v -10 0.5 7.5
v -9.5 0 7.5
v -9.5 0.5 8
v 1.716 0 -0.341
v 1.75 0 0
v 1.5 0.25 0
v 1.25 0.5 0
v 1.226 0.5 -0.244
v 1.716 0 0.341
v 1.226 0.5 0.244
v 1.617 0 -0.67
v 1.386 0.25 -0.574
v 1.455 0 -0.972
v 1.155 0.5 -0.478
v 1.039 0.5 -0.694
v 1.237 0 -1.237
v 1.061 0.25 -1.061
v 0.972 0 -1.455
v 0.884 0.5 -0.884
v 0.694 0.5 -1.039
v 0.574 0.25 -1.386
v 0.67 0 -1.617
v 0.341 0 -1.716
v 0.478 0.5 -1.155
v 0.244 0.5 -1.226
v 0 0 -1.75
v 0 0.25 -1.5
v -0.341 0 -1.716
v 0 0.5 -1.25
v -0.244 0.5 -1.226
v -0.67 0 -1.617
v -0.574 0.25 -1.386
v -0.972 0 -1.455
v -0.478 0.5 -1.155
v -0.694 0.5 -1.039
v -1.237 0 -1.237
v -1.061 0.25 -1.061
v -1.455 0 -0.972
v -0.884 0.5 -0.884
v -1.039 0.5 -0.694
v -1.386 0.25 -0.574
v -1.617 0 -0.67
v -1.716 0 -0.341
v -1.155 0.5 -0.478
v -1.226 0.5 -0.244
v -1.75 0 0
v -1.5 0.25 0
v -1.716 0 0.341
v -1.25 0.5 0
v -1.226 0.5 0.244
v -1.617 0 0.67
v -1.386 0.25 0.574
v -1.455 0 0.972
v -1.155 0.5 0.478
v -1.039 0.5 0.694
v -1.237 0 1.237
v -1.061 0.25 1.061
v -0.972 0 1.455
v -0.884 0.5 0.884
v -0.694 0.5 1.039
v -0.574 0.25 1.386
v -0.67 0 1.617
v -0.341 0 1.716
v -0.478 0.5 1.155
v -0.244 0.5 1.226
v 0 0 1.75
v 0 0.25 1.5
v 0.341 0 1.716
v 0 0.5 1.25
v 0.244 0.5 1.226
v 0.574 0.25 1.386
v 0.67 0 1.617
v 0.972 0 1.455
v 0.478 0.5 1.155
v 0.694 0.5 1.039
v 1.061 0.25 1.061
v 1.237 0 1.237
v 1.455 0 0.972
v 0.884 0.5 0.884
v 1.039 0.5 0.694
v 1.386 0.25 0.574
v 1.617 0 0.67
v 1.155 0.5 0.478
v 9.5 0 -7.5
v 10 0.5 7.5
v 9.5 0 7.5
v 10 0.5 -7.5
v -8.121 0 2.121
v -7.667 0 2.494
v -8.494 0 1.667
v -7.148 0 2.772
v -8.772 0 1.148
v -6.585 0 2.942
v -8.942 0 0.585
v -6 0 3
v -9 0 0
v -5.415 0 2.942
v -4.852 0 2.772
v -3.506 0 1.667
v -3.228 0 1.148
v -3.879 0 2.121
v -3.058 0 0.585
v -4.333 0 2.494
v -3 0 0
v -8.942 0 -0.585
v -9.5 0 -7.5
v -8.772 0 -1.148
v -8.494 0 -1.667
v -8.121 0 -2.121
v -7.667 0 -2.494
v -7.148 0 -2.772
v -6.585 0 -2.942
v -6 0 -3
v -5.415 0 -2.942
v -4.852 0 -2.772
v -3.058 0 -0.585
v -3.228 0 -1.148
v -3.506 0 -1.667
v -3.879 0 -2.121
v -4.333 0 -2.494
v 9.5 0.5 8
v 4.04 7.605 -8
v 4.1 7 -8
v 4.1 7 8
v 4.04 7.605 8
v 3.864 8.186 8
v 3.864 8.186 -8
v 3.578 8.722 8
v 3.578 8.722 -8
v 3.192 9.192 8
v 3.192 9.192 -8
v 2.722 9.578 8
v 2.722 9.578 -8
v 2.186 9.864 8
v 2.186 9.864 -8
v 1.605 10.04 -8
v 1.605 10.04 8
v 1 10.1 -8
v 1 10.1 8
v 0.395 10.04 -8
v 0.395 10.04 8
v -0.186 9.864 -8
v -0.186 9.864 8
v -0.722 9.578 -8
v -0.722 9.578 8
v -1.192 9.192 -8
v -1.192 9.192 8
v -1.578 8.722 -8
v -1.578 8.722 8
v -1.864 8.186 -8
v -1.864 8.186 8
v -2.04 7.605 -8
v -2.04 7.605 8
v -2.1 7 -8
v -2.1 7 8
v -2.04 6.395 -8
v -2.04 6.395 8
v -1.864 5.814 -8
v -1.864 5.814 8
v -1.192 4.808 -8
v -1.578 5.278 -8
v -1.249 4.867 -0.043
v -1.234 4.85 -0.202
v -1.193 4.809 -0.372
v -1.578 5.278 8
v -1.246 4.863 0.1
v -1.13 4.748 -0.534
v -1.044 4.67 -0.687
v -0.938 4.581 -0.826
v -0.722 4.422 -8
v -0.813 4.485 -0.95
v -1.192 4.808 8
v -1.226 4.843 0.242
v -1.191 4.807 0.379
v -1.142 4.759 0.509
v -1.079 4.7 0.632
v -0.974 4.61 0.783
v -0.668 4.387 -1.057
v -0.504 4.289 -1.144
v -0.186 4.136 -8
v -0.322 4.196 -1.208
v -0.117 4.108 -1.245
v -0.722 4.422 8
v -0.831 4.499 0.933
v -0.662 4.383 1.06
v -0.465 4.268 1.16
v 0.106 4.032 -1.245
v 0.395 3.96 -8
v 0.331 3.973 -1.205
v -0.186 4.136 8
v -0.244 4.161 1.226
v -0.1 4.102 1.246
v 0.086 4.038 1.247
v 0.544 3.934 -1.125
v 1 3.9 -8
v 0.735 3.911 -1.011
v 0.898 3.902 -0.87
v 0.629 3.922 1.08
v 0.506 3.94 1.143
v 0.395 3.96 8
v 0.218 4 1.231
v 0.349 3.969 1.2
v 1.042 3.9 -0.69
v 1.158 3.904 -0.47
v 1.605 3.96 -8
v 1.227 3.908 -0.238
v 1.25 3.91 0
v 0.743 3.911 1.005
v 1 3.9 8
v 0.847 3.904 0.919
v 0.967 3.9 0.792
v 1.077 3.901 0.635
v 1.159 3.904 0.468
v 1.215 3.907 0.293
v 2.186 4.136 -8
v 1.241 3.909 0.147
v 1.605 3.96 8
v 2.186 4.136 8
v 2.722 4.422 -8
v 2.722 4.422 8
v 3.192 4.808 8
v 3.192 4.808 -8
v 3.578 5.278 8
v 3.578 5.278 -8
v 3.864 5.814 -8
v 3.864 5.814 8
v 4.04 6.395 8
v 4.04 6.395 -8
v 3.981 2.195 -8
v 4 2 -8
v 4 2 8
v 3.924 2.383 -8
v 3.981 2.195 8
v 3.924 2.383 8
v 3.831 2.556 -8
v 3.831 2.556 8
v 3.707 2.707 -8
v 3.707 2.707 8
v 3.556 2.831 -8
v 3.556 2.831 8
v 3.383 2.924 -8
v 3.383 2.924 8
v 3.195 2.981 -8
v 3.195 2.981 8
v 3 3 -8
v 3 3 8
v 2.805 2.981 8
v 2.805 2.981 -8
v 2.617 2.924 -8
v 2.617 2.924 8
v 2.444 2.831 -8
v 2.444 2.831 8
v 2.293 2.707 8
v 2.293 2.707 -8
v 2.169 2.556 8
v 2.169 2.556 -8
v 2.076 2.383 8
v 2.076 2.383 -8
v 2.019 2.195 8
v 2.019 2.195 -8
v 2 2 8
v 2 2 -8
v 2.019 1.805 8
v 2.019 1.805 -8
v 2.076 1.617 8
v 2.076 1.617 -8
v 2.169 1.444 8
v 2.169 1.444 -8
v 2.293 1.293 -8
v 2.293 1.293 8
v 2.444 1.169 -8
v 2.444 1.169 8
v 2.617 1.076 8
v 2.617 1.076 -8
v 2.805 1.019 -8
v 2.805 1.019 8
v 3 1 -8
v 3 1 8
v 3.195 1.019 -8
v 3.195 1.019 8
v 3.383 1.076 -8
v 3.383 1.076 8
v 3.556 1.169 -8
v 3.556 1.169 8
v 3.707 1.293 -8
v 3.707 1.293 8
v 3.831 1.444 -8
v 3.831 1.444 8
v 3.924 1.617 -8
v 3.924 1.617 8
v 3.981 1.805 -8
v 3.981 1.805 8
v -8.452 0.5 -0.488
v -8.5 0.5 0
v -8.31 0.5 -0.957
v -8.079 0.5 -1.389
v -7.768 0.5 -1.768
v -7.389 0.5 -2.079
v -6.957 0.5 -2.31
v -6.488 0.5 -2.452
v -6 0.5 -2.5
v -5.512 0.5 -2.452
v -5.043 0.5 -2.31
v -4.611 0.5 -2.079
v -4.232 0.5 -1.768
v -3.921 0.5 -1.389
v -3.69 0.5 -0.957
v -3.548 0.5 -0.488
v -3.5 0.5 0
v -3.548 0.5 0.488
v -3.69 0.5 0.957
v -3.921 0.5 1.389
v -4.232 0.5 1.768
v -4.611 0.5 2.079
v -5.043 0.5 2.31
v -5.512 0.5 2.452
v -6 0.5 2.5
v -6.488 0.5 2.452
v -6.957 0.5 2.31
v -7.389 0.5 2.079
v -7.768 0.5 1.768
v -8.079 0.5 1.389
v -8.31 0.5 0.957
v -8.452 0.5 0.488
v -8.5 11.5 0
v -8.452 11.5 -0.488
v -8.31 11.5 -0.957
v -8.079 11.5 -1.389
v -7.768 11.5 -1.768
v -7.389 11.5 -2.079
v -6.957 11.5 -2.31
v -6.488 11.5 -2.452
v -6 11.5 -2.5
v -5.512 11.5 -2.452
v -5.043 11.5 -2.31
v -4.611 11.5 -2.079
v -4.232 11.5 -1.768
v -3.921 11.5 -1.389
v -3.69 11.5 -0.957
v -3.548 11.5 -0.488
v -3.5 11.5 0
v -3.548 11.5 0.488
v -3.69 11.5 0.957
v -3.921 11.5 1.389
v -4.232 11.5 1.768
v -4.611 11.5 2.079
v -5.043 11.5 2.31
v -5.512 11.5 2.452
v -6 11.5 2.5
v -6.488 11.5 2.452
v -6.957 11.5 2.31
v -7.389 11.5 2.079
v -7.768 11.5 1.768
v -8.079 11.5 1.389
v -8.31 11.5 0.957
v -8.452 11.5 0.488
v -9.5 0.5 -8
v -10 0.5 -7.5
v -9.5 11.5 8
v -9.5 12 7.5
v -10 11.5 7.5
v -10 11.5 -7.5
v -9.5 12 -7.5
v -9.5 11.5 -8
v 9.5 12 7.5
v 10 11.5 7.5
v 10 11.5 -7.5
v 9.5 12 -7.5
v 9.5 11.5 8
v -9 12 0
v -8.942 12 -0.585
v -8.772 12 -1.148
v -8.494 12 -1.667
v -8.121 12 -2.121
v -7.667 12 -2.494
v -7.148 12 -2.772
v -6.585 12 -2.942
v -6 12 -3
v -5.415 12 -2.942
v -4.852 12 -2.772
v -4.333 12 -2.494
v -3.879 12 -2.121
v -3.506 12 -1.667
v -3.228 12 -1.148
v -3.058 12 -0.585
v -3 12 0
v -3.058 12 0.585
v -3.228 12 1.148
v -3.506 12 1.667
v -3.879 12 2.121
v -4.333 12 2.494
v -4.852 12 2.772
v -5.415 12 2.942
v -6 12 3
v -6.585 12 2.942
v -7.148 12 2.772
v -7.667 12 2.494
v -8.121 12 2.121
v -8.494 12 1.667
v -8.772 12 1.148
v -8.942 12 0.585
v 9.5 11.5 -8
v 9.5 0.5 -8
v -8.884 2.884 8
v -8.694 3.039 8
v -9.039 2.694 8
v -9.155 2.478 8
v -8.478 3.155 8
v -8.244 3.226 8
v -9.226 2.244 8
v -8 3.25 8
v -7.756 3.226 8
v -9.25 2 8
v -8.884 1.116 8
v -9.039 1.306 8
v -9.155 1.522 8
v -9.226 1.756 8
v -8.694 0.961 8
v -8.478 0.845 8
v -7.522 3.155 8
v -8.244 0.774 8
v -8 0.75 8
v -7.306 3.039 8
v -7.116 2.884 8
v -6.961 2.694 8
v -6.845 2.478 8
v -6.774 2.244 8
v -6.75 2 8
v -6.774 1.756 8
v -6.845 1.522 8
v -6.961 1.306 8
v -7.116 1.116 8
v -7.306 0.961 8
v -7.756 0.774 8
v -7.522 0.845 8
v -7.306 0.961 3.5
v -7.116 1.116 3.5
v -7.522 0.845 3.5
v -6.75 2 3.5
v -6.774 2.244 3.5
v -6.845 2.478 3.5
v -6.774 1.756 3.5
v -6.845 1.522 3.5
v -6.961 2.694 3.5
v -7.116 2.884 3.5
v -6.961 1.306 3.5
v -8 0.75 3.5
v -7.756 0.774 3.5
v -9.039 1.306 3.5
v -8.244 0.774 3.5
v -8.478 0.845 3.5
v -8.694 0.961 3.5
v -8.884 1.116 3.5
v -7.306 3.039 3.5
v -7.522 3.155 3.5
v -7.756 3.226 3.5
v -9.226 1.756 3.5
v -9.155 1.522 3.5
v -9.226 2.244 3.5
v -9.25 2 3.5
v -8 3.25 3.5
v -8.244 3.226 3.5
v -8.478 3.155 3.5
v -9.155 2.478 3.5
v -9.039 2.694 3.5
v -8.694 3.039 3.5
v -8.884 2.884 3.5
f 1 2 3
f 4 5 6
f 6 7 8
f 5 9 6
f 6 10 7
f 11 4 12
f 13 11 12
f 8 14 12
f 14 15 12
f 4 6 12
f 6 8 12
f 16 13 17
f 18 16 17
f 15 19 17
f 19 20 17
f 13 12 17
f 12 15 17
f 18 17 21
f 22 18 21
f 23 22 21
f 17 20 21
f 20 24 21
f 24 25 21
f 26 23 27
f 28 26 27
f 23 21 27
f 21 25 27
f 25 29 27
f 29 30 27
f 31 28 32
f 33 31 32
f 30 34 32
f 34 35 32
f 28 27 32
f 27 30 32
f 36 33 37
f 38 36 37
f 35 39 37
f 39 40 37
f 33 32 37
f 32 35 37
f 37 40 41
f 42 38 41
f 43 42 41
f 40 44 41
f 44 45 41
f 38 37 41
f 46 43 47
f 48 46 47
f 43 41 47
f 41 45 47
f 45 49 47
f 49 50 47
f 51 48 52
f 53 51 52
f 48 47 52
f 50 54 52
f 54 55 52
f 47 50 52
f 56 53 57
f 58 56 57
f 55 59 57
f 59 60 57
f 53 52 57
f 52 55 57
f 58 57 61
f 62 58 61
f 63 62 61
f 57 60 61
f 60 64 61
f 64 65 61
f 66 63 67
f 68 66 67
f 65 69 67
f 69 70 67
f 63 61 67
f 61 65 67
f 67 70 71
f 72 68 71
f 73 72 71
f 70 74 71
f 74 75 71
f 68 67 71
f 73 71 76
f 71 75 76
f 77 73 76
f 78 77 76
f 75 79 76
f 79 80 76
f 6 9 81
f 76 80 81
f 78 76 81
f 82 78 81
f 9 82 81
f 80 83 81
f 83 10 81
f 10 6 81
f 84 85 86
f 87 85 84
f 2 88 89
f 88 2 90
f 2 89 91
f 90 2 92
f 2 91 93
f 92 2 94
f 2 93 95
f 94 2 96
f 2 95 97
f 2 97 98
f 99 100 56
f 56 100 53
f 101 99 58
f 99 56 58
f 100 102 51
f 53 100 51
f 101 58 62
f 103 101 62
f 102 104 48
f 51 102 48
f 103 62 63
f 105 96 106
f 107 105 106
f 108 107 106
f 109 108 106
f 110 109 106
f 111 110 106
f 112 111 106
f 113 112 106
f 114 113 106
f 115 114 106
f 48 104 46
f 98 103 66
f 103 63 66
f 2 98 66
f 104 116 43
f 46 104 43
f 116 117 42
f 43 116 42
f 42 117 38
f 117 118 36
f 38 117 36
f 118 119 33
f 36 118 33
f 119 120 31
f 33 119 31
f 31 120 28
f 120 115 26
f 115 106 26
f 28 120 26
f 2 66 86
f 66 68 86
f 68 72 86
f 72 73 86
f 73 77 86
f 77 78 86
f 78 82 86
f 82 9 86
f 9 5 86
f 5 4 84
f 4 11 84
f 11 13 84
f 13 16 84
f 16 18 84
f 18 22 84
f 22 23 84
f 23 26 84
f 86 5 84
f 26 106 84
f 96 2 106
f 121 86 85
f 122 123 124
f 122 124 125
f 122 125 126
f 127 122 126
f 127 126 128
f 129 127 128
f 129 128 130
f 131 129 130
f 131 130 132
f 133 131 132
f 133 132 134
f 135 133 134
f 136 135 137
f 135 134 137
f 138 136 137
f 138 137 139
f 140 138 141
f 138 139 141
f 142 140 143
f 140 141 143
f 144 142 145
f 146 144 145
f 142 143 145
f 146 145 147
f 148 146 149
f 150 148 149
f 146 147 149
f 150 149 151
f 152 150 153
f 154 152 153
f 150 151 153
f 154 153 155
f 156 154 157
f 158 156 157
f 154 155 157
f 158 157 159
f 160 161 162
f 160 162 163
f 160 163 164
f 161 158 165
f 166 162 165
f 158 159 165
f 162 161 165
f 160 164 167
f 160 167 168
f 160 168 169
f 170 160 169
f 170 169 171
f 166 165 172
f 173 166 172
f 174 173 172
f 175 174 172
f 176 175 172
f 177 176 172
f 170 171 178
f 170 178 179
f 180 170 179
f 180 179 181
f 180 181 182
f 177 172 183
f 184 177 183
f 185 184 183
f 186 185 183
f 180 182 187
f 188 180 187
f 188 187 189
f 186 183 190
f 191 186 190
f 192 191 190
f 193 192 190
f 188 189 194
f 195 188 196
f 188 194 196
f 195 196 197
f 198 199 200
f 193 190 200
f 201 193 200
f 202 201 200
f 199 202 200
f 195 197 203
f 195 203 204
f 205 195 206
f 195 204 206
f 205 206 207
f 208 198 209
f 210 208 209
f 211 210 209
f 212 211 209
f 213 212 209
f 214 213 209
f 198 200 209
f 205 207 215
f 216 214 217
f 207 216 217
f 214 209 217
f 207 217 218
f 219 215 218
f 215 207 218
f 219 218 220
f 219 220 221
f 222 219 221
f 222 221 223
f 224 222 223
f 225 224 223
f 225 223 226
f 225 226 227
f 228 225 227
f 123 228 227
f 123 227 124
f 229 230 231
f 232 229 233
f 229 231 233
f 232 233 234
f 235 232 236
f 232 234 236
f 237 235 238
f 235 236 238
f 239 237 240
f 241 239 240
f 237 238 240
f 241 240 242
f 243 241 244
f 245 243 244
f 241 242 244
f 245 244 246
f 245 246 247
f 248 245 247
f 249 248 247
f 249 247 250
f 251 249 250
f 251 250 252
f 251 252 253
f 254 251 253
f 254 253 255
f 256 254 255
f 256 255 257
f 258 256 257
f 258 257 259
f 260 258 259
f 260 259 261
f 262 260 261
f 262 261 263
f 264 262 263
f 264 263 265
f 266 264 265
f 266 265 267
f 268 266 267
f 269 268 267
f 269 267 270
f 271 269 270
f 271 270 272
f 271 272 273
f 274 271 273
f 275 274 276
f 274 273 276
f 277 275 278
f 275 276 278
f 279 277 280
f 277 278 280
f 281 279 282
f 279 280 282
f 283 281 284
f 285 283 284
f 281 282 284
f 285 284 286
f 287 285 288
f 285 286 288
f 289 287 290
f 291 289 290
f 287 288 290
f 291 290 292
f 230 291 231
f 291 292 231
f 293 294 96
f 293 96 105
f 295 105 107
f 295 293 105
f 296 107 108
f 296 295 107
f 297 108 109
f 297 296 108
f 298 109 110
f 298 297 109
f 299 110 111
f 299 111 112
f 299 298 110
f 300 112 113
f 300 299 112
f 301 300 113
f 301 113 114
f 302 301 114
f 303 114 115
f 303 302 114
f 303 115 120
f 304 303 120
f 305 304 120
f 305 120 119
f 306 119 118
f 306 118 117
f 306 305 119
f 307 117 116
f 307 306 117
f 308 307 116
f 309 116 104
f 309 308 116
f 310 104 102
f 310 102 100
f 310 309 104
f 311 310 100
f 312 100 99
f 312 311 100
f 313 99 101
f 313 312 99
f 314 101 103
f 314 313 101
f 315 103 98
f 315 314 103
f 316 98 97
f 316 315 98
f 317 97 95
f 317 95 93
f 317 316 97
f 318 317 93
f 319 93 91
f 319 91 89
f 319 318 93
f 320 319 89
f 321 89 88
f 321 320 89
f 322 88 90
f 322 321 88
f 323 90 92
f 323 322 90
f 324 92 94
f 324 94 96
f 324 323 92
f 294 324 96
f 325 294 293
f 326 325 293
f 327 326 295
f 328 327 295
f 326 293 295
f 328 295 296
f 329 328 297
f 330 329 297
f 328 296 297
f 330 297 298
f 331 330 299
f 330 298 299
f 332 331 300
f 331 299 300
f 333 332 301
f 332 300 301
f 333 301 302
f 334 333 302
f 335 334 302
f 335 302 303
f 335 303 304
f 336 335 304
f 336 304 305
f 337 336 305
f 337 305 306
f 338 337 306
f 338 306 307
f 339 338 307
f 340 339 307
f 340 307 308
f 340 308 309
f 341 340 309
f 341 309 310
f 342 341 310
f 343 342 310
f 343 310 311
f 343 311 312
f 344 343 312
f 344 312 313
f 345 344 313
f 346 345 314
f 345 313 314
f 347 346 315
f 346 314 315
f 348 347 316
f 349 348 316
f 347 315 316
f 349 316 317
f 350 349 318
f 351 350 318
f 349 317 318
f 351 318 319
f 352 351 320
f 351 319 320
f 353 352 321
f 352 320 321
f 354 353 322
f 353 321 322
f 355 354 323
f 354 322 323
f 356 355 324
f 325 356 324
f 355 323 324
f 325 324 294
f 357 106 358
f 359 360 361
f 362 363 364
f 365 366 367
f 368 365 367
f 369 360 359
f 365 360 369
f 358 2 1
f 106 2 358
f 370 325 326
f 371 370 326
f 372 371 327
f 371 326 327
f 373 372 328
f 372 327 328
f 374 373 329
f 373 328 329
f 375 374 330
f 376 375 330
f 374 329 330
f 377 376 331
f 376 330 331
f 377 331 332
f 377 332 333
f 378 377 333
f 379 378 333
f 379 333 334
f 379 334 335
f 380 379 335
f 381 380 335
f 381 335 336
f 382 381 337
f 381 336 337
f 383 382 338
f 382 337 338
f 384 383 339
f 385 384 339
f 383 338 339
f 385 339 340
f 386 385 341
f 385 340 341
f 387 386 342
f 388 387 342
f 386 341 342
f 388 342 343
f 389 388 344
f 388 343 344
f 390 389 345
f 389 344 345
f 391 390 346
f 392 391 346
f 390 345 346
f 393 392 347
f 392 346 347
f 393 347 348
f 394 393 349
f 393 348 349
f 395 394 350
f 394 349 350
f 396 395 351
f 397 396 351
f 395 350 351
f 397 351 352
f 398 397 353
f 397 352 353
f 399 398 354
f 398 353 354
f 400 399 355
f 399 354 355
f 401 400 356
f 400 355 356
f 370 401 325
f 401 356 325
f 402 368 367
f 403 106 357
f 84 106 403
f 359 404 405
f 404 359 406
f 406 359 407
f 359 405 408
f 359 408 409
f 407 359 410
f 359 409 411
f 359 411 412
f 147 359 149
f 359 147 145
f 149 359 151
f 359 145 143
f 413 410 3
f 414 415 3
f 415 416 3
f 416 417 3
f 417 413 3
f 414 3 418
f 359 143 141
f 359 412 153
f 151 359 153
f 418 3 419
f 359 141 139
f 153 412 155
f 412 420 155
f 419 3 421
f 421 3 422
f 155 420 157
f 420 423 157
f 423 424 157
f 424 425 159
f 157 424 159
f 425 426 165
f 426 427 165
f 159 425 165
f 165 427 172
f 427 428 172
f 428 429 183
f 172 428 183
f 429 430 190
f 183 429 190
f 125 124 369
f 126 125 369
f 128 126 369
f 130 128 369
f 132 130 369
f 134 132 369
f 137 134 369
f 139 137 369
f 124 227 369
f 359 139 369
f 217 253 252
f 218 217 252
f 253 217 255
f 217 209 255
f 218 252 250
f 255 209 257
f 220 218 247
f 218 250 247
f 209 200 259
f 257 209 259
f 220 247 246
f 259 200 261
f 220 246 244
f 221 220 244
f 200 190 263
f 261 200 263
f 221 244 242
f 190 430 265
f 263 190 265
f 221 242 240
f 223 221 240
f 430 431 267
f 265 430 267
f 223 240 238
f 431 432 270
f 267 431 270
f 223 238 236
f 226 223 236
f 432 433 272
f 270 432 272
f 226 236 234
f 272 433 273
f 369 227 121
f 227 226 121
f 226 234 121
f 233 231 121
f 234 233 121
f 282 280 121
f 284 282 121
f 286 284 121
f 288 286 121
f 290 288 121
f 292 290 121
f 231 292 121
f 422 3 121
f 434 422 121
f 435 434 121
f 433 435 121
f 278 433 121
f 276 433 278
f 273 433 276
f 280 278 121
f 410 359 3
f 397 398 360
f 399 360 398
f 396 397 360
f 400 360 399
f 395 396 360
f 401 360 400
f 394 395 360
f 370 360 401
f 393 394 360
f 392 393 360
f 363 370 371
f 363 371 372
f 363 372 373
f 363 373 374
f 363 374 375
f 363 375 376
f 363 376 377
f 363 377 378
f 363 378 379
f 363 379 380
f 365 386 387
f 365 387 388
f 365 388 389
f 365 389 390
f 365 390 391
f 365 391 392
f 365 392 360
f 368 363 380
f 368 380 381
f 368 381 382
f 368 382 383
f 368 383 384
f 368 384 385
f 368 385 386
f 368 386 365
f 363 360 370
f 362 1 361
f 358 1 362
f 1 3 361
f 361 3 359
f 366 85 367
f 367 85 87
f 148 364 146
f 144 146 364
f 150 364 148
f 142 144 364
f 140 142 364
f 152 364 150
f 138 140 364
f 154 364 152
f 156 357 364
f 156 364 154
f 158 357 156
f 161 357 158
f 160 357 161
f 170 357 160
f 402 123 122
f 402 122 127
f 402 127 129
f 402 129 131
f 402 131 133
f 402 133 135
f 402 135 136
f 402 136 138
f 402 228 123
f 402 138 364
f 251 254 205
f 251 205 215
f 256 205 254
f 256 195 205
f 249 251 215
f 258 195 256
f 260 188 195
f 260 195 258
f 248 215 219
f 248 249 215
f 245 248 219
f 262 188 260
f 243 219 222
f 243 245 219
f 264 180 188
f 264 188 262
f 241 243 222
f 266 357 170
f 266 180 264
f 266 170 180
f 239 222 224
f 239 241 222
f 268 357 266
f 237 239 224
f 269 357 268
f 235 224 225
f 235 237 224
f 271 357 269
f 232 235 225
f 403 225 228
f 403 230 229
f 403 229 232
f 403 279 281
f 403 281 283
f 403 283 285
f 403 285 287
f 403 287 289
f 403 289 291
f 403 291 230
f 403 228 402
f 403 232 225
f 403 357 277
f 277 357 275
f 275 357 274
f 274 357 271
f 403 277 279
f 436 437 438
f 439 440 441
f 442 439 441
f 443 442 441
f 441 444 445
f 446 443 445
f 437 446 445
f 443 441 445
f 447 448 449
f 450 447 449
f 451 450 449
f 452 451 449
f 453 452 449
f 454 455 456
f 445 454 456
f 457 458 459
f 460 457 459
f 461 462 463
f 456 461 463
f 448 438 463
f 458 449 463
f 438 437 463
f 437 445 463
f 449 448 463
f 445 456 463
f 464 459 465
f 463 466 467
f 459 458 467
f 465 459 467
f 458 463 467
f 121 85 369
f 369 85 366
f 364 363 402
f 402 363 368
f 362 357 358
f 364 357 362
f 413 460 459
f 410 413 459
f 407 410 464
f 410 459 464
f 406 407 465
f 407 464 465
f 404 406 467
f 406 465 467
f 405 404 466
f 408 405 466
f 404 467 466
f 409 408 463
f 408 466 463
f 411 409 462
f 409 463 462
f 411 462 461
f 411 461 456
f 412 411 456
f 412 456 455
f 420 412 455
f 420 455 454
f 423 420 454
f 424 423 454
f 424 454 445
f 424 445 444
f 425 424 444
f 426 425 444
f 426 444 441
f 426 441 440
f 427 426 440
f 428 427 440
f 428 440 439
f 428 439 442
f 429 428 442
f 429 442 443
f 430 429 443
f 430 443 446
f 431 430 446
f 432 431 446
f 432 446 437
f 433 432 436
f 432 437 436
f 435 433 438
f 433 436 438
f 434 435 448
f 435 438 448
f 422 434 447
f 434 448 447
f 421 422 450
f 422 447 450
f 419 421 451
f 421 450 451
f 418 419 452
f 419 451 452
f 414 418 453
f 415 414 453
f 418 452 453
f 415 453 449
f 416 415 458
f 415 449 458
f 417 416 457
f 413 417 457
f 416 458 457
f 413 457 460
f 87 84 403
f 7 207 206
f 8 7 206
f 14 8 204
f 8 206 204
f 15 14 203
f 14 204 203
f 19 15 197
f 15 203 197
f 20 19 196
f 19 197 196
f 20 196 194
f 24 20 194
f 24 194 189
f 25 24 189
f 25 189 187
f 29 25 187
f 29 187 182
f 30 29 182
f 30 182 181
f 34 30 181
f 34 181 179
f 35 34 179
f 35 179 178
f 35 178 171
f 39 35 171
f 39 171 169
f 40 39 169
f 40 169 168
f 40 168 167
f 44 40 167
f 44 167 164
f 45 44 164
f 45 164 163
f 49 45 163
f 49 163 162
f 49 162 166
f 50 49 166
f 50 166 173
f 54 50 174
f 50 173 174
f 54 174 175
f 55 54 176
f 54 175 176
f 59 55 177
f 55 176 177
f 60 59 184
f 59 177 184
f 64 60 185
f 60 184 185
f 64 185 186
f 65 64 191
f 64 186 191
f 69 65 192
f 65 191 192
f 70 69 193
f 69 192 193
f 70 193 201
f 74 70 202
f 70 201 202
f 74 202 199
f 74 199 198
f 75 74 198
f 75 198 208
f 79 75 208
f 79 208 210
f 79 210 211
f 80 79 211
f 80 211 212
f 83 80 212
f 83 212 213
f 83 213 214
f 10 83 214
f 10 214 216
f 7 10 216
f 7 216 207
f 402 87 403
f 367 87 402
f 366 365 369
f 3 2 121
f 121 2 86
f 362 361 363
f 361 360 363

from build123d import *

# Parameters (mm, degrees)
SKETCH1_W                       = 20
SKETCH1_H                       = 16
BOSS_EXTRUDE1_DEPTH             = 12
SKETCH2_R                       = 3.1
SKETCH2_R_2                     = 1
CUT_EXTRUDE1_DEPTH              = 17
F_2_5_2_5_DIAMETER_HOLE1_D      = 2.5
F_2_5_2_5_DIAMETER_HOLE1_DEPTH  = 4.5
TAP_DRILL_FOR_M6X1_0_TAP1_D     = 5
TAP_DRILL_FOR_M3X0_5_TAP1_D     = 2.5
TAP_DRILL_FOR_M3X0_5_TAP1_DEPTH = 6.999
TAP_DRILL_FOR_M3X0_5_TAP1_TIP   = 0.751075774
CHAMFER1_SIZE                   = 0.5


with BuildPart() as part:
    # Sketch1 → Boss-Extrude1 (new body)
    with BuildSketch(Plane(origin=(0, 0, 0), x_dir=(1, 0, 0), z_dir=(0, 1, 0))):
        Rectangle(SKETCH1_W, SKETCH1_H)
    extrude(amount=BOSS_EXTRUDE1_DEPTH)

    # Sketch2 → Cut-Extrude1 (cut, through all)
    with BuildSketch(Plane.XY.offset(8)):
        with Locations((1, 7)):
            Circle(SKETCH2_R)
        with Locations((3, 2)):
            Circle(SKETCH2_R_2)
    extrude(amount=-CUT_EXTRUDE1_DEPTH, mode=Mode.SUBTRACT)

    # Ø2.5 (2.5) Diameter Hole1
    with Locations(Plane.XY.offset(8)):
        with Locations((-8, 2)):
            Hole(F_2_5_2_5_DIAMETER_HOLE1_D / 2, depth=F_2_5_2_5_DIAMETER_HOLE1_DEPTH)

    # Tap Drill for M6x1.0 Tap1 (through all)
    with Locations(Plane(origin=(0, 12, 0), x_dir=(1, 0, 0), z_dir=(0, 1, 0))):
        with Locations((-6, 0)):
            Hole(TAP_DRILL_FOR_M6X1_0_TAP1_D / 2)

    # Tap Drill for M3x0.5 Tap1
    with Locations(Plane(origin=(0, 0, 0), x_dir=(-1, 0, 0), z_dir=(0, -1, 0))):
        with Locations((0, 0)):
            Hole(TAP_DRILL_FOR_M3X0_5_TAP1_D / 2, depth=TAP_DRILL_FOR_M3X0_5_TAP1_DEPTH)
            with Locations((0, 0, -(TAP_DRILL_FOR_M3X0_5_TAP1_DEPTH + TAP_DRILL_FOR_M3X0_5_TAP1_TIP / 2))):  # 118° drill point
                Cone(0, TAP_DRILL_FOR_M3X0_5_TAP1_D / 2, TAP_DRILL_FOR_M3X0_5_TAP1_TIP, mode=Mode.SUBTRACT)

    # Chamfer1
    chamfer1_edges = [part.edges().sort_by_distance(p)[0] for p in [
        (0, 12, -8),
        (-10, 12, 0),
        (-3.5, 12, 0),
        (-3.5, 0, 0),
        (-1.25, 0, 0),
        (0, 12, 8),
        (-10, 0, 0),
        (0, 0, -8),
        (10, 0, 0),
        (0, 0, 8),
        (10, 12, 0),
        (-10, 6, 8),
        (-10, 6, -8),
        (10, 6, -8),
        (10, 6, 8),
    ]]
    chamfer(chamfer1_edges, length=CHAMFER1_SIZE)


solid = part.part
